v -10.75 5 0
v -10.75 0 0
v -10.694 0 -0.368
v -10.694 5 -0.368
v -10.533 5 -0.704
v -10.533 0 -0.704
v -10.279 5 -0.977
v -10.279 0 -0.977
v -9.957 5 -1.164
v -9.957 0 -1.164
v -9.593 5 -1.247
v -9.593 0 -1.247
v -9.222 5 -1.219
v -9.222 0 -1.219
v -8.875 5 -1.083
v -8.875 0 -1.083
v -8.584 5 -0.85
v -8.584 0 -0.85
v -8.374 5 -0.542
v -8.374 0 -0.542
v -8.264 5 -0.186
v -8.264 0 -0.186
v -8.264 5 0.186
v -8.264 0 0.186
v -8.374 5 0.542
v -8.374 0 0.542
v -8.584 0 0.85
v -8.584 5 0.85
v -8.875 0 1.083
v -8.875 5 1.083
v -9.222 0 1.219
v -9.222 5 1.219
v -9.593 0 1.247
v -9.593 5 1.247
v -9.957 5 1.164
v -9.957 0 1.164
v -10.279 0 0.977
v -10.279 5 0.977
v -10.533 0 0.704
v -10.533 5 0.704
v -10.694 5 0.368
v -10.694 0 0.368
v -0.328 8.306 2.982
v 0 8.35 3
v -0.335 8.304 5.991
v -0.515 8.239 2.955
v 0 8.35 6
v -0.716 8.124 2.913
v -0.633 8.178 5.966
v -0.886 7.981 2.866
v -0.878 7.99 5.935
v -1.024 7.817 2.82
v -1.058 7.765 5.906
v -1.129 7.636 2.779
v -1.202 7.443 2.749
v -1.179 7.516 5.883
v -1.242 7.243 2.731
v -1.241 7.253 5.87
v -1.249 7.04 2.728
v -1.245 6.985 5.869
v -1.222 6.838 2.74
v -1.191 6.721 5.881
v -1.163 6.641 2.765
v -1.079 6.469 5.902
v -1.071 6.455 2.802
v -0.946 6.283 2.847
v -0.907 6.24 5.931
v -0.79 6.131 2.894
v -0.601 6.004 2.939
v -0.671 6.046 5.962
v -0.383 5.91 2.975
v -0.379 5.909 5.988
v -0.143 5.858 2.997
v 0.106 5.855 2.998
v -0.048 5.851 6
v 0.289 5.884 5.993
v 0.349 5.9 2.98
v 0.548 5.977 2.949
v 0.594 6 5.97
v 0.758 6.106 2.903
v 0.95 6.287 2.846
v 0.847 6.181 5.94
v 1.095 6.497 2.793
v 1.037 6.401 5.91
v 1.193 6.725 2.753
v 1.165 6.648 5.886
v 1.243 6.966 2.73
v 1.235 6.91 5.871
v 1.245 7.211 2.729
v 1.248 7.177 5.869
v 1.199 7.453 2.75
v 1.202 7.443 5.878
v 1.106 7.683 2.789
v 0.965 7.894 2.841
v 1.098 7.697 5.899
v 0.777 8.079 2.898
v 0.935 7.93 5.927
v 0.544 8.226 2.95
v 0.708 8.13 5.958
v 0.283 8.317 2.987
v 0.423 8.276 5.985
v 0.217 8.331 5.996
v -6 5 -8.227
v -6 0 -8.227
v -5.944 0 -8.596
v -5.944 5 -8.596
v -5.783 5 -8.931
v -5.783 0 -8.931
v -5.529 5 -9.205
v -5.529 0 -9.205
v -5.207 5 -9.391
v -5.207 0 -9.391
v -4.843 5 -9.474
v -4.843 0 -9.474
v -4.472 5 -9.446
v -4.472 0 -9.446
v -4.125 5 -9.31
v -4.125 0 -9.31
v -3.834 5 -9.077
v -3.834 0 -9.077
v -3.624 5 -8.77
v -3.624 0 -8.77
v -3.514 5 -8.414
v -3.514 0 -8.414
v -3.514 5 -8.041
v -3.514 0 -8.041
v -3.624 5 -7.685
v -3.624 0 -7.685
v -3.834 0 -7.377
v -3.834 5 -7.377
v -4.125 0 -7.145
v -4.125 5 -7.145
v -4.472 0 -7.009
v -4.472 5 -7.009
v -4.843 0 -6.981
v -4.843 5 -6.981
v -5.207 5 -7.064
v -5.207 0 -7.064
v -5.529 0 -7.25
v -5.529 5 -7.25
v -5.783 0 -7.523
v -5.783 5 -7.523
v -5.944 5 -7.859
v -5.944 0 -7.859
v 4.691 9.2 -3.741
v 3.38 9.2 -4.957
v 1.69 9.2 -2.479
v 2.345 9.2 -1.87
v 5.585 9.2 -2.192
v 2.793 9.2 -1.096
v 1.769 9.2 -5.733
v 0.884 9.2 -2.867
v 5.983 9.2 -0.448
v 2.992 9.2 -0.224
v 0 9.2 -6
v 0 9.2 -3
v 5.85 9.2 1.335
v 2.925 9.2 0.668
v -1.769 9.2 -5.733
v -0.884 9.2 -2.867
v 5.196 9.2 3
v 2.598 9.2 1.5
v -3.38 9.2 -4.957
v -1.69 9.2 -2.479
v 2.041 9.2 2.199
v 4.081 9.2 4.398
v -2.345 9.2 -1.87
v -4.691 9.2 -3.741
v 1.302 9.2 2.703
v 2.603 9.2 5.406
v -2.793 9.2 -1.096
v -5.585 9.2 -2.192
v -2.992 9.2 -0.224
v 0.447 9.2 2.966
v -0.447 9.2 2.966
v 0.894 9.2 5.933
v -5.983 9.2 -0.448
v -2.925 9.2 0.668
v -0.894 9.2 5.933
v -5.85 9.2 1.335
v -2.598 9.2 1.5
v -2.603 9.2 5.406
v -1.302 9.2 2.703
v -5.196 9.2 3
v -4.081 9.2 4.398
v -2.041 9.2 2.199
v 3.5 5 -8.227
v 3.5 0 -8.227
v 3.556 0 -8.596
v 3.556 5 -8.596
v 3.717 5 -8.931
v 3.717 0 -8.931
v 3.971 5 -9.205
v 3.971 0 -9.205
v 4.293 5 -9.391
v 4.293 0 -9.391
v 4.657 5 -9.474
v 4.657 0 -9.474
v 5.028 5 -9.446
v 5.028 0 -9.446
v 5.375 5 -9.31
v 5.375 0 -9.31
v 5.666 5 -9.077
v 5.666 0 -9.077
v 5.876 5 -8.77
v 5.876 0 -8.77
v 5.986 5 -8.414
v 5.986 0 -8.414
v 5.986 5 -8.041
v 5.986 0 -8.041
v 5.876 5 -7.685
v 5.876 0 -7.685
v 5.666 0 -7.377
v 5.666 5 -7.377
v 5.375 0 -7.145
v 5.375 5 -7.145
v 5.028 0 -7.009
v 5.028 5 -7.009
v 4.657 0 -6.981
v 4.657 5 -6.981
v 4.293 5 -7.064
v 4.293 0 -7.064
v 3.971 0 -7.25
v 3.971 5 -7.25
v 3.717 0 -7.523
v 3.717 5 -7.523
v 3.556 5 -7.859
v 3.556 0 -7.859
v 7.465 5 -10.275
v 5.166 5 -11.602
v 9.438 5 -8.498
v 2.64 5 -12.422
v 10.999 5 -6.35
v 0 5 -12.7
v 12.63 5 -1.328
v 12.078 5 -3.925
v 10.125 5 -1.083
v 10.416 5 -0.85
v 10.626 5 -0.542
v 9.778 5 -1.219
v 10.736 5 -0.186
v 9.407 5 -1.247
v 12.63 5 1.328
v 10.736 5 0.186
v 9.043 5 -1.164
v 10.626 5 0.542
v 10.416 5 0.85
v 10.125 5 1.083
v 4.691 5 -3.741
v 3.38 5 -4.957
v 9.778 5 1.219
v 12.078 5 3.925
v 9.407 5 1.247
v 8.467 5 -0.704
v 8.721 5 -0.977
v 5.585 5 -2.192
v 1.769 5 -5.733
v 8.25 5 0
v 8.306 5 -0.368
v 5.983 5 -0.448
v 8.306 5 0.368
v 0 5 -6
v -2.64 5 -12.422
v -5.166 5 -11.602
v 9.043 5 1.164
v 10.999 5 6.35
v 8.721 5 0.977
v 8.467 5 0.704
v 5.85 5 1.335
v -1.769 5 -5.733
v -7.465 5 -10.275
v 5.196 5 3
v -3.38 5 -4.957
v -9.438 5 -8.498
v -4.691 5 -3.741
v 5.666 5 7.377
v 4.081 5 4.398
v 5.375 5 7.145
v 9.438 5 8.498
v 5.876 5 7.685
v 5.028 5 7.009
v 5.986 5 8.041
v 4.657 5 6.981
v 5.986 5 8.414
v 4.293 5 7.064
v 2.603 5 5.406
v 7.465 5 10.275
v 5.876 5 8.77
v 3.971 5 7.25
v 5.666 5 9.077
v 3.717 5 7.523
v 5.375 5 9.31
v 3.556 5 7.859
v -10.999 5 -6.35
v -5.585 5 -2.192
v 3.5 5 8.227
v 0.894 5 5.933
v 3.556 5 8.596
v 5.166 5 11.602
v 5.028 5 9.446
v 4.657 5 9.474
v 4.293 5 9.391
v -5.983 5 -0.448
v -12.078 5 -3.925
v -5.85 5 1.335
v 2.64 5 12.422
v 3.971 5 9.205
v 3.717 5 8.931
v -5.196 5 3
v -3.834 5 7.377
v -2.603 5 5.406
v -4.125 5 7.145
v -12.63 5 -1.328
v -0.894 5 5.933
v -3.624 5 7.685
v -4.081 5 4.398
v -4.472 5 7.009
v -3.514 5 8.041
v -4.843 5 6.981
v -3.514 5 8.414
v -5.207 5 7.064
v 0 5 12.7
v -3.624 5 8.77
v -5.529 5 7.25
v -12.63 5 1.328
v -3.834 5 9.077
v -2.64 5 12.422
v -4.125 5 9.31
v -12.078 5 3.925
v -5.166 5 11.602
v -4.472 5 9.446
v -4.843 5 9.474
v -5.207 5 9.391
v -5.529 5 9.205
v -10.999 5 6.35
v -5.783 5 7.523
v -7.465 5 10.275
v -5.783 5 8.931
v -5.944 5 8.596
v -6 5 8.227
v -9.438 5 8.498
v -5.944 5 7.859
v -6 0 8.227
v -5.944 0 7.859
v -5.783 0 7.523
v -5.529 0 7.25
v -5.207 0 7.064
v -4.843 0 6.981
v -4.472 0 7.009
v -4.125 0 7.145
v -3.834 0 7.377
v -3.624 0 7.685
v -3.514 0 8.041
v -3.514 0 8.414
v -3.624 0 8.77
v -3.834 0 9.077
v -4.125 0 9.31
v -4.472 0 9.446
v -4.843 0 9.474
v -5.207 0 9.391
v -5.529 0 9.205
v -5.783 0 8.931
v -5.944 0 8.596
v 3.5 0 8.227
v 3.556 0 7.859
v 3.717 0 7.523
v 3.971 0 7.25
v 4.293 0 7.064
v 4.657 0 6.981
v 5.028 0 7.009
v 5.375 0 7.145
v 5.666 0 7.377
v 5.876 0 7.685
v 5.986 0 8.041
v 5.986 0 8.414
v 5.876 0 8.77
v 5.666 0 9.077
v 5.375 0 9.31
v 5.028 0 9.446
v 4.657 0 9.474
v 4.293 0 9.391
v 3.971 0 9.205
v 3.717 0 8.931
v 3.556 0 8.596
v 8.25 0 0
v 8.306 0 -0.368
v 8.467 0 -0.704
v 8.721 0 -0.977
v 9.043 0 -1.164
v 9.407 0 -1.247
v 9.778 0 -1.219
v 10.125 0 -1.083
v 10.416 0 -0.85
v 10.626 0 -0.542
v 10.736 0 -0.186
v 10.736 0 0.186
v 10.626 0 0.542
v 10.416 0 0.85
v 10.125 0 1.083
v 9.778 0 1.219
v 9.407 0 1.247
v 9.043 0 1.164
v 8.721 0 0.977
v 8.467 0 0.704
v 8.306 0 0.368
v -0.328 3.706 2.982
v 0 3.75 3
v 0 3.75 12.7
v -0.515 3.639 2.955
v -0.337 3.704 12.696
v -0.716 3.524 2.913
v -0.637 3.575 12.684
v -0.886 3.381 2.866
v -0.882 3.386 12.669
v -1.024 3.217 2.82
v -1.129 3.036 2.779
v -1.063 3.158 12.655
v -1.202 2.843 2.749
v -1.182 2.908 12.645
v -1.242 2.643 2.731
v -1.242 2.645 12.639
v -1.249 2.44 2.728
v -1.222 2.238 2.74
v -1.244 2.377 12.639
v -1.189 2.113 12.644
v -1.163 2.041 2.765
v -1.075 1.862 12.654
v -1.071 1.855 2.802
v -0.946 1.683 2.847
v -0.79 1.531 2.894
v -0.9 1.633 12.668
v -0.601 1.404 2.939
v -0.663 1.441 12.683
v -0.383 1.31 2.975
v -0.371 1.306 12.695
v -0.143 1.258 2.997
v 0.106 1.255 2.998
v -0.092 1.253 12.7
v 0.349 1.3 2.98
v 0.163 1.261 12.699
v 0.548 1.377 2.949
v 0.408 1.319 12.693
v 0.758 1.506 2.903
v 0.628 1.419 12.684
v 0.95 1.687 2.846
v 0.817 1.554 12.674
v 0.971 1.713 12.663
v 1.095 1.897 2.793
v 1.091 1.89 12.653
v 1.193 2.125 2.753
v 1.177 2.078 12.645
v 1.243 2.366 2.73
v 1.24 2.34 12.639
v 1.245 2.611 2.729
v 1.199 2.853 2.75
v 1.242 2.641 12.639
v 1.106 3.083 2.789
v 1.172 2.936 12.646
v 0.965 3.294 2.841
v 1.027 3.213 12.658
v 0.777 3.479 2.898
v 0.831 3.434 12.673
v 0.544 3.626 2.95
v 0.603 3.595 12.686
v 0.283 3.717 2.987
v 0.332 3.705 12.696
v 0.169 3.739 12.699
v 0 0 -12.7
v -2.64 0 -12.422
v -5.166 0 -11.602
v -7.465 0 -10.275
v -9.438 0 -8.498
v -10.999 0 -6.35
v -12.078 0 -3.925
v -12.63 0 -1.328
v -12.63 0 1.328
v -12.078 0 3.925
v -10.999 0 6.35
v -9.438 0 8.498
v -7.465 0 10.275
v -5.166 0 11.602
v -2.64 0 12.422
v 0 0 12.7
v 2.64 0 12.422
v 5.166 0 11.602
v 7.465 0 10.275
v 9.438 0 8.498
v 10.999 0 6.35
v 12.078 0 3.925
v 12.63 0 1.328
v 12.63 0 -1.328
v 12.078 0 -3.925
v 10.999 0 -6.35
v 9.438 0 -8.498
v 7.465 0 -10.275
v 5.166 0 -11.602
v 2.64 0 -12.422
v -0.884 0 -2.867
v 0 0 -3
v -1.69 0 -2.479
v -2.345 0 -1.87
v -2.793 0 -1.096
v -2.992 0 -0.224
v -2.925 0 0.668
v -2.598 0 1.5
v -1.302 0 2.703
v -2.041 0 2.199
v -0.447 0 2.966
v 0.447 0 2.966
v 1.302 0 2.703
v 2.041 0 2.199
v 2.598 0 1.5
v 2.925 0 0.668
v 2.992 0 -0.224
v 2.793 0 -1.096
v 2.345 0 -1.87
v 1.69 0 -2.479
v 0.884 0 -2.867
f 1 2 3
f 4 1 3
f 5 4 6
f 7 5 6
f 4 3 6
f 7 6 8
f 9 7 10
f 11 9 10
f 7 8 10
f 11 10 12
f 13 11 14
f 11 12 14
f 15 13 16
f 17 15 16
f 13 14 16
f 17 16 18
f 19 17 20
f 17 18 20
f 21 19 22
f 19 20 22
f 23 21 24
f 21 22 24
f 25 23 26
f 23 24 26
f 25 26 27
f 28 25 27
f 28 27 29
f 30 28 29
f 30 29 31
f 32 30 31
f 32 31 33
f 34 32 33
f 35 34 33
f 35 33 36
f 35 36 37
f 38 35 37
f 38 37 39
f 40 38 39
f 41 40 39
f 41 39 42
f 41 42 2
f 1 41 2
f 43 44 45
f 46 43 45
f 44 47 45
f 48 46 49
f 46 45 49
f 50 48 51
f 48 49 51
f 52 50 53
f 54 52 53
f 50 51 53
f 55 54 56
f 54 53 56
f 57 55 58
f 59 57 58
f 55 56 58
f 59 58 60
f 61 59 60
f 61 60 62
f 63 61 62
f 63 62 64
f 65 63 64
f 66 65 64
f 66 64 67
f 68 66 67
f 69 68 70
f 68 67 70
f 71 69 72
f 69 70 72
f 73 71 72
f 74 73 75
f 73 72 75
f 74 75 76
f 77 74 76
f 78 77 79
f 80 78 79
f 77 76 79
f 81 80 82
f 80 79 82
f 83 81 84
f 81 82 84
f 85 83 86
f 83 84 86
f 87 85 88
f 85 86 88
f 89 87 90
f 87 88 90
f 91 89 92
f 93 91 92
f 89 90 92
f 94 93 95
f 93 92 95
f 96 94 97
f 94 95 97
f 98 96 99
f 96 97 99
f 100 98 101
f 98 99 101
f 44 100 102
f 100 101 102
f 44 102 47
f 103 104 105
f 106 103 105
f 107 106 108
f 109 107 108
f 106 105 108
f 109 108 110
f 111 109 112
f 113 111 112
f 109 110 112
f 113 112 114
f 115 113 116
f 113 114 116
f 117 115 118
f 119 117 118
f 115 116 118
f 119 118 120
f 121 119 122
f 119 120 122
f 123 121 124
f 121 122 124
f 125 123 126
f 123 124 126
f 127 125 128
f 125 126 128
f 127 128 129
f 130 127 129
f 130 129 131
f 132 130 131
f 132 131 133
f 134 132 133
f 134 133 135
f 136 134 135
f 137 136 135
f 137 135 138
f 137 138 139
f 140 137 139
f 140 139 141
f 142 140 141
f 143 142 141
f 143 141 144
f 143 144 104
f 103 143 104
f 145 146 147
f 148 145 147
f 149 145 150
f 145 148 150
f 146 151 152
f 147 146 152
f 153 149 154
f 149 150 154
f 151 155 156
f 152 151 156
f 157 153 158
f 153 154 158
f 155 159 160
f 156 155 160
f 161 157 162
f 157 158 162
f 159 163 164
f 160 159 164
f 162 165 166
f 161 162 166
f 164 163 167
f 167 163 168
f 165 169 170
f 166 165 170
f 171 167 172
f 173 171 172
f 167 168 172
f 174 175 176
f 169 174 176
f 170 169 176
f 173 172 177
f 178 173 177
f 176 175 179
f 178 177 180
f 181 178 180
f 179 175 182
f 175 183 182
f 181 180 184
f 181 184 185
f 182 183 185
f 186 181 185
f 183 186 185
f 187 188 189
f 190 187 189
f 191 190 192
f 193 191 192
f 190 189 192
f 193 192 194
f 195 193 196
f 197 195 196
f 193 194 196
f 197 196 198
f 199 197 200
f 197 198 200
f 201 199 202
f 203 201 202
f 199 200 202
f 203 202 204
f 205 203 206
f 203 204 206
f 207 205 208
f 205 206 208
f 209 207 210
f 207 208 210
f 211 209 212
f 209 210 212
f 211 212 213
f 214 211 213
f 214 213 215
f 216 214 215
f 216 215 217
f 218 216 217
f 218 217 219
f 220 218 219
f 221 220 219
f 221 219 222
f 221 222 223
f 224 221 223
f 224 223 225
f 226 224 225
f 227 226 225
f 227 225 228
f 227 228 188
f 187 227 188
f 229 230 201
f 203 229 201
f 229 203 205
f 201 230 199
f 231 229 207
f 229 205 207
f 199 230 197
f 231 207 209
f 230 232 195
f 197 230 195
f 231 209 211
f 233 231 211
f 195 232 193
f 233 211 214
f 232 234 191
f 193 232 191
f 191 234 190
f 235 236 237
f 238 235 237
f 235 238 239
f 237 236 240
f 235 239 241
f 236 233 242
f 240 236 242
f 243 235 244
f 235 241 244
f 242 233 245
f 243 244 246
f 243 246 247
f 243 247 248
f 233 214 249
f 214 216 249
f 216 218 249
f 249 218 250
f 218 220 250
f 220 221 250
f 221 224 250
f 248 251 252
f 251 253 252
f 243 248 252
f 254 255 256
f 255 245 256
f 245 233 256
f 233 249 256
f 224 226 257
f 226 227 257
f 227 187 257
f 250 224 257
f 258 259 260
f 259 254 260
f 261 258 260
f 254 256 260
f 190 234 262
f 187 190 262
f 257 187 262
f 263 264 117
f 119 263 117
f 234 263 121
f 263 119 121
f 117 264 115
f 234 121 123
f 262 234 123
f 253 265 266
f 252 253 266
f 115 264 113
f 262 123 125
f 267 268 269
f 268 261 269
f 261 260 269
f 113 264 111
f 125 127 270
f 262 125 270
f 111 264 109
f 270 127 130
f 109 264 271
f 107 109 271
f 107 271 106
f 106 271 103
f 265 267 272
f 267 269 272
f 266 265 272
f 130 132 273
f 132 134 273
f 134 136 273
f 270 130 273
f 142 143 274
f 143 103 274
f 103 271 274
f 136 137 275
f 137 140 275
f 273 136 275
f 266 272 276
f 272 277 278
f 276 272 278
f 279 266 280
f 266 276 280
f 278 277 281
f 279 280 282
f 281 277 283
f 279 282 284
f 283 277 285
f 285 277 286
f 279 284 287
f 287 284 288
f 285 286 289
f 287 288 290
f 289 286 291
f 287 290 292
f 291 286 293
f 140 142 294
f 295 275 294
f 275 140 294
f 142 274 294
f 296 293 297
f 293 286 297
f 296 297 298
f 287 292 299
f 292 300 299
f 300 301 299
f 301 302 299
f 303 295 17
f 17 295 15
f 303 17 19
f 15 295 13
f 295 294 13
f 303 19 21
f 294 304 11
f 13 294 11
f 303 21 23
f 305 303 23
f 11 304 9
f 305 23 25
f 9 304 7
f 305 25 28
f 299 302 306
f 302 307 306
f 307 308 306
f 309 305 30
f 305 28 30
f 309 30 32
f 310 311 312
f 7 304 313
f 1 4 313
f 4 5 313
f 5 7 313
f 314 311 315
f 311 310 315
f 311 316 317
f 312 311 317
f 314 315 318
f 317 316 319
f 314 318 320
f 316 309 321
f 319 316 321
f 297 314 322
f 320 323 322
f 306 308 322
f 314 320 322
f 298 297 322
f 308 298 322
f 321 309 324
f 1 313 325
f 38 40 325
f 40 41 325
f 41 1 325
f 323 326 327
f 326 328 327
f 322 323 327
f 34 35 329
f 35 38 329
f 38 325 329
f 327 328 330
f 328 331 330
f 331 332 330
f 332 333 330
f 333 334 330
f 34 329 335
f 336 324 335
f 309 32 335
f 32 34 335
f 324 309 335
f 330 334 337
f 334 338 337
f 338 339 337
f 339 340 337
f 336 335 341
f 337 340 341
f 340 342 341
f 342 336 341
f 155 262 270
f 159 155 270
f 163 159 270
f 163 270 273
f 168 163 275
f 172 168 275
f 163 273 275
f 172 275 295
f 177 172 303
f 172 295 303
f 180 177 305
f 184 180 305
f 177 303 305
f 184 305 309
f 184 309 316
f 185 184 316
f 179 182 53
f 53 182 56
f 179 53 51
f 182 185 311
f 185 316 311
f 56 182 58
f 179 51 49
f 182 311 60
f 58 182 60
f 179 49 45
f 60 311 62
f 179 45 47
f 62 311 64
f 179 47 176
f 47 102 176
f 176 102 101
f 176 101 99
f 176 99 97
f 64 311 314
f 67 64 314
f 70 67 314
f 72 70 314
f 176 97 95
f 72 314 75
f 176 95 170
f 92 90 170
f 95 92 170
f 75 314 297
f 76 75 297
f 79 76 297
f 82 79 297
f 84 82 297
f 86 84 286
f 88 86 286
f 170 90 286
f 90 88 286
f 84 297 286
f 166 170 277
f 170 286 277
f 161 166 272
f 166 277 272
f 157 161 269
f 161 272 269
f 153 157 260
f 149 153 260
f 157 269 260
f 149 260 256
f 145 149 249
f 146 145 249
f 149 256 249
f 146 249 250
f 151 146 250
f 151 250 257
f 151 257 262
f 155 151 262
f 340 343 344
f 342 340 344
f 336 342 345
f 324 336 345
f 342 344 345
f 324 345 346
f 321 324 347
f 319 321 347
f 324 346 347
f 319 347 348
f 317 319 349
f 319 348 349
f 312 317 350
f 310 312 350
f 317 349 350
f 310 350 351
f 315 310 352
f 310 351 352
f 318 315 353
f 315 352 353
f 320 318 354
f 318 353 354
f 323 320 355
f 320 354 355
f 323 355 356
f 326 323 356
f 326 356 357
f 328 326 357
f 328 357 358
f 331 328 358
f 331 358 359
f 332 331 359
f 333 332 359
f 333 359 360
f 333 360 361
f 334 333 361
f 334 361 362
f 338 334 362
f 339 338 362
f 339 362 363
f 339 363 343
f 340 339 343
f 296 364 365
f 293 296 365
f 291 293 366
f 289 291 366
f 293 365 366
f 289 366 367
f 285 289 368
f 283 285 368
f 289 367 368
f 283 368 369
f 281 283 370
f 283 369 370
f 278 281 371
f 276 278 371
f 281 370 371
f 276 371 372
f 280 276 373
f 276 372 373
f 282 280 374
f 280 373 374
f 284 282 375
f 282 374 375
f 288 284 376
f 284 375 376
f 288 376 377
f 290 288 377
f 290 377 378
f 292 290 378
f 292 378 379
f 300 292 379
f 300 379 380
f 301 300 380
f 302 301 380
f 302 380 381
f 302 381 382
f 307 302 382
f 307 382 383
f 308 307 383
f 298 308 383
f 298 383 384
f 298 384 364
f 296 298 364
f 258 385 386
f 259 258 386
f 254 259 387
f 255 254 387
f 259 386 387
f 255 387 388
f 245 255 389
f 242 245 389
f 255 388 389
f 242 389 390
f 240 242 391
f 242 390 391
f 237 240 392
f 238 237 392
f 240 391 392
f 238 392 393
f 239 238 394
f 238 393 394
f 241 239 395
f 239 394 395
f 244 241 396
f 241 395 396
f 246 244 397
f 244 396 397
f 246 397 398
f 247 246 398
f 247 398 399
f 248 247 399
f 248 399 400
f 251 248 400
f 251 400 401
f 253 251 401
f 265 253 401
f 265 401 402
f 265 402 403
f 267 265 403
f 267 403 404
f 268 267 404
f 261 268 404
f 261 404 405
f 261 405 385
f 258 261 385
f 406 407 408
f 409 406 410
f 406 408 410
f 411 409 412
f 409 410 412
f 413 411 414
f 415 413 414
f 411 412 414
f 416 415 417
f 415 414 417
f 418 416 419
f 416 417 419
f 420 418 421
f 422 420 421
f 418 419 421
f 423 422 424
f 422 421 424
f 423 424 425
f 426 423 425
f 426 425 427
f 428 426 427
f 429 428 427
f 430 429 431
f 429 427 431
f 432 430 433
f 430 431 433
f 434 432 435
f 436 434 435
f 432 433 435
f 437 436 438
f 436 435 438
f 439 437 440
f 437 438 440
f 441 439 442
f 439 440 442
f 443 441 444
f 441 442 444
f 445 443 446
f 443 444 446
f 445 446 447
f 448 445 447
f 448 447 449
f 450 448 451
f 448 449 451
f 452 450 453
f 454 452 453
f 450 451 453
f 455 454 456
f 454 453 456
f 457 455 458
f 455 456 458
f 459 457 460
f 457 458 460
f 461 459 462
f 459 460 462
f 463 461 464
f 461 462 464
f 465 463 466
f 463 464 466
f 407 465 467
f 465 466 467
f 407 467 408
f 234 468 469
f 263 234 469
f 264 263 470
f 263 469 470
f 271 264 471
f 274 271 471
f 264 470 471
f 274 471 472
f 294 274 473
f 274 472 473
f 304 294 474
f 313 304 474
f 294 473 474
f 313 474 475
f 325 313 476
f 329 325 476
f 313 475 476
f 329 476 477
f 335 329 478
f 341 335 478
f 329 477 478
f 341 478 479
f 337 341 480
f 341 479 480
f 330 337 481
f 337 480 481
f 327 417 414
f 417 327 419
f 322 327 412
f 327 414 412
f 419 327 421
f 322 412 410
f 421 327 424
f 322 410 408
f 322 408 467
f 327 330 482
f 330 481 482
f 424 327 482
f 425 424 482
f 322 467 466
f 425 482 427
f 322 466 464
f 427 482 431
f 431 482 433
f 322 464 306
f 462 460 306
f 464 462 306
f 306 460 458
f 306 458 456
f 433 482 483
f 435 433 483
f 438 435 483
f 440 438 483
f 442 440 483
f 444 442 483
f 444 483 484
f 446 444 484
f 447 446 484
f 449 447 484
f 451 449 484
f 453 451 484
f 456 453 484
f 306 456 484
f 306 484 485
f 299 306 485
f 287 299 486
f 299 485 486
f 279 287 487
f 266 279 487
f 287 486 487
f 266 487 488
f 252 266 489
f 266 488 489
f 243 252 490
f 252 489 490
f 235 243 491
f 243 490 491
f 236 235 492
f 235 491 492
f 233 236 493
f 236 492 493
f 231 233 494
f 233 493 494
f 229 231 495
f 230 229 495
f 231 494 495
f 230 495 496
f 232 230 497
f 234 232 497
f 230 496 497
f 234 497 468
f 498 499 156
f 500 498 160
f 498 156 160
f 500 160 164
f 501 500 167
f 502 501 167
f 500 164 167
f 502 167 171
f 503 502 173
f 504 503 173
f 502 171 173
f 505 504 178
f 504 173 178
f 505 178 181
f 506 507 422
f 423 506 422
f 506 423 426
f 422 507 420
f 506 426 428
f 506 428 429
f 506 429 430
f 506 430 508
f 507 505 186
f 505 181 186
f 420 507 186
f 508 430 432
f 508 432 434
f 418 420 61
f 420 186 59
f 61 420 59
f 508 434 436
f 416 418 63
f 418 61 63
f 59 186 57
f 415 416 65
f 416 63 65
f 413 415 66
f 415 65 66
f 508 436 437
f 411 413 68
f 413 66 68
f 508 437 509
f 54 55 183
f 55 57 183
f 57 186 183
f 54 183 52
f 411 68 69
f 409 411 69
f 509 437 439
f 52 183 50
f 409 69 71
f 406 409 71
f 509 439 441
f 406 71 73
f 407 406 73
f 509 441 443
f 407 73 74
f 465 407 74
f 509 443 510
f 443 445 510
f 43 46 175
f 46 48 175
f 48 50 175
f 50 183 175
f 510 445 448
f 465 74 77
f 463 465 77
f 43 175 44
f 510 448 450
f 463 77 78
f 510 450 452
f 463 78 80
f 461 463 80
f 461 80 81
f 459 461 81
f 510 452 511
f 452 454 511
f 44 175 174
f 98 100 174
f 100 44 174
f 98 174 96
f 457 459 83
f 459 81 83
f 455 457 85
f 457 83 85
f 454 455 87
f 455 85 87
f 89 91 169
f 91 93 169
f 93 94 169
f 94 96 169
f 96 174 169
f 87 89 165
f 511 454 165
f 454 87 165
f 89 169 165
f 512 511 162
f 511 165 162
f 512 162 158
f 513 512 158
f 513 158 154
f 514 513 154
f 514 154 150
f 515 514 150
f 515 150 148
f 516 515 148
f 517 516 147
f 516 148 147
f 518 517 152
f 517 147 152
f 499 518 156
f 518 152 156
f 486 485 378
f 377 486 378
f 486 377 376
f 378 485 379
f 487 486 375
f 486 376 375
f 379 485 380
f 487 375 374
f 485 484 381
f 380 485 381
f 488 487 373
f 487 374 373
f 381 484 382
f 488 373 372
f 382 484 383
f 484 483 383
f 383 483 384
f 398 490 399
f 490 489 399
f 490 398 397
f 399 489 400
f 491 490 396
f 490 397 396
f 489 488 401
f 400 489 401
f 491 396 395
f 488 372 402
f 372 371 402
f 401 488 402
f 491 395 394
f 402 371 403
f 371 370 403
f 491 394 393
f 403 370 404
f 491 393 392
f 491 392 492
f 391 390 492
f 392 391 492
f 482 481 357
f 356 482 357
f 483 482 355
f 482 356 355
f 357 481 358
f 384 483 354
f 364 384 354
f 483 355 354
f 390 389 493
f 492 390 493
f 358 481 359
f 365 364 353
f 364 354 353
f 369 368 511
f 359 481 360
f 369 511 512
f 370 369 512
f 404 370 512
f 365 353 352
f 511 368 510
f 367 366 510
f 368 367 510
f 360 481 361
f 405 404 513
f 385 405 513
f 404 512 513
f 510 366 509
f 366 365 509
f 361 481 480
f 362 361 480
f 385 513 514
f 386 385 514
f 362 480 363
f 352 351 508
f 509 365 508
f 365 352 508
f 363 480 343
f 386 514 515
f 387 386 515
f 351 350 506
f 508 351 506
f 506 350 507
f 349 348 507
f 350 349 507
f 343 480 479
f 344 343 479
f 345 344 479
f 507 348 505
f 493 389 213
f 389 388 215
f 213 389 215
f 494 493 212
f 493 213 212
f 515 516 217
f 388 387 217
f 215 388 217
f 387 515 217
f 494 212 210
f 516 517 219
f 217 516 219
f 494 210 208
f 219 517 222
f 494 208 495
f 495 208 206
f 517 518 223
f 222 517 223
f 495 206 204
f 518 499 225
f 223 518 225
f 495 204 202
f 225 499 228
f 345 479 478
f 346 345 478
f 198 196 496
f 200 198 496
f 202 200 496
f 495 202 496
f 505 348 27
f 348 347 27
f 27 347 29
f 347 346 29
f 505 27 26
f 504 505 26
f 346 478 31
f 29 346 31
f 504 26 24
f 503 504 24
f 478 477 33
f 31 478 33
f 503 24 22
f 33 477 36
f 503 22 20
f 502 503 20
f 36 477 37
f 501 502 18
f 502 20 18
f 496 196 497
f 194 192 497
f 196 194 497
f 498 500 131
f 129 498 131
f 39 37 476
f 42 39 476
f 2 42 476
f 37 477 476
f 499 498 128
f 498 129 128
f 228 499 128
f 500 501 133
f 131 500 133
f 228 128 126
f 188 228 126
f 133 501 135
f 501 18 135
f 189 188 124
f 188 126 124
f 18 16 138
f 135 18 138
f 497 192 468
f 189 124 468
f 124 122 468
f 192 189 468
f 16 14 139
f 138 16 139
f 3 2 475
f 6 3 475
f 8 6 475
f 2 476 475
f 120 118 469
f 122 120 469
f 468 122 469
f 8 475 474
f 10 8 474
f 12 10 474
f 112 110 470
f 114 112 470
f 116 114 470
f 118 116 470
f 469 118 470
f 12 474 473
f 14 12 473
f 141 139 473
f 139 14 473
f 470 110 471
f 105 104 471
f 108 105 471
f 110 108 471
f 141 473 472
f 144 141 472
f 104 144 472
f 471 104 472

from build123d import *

# Parameters (mm, degrees)
TAP_DRILL_FOR_M3_TAP1_D          = 2.5
SKETCH6_W                        = 1.25
SKETCH6_H                        = 12.7
TAP_DRILL_FOR_M3_TAP2_AT_2_COUNT = 2
TAP_DRILL_FOR_M3_TAP2_AT_2_PITCH = 4.6


with BuildPart() as part:
    # Sketch1 → Revolve1 (revolve)
    with BuildSketch(Plane.XY, mode=Mode.PRIVATE) as revolve1_sk:
        Polygon((3, 0), (3, 9.2), (6, 9.2), (6, 5), (12.7, 5), (12.7, 0), align=None)
    revolve(revolve1_sk.sketch.rotate(Axis((0, 0, 0), (0, 1, 0)), 90), axis=Axis((0, 0, 0), (0, 1, 0)))

    # Tap Drill for M3 Tap1 (through all)
    with Locations(Plane(origin=(0, 5, 0), x_dir=(1, 0, 0), z_dir=(0, 1, 0))):
        with Locations((-9.5, 0), (-4.75, 8.227241336), (4.75, 8.227241336), (9.5, 0), (4.75, -8.227241336), (-4.75, -8.227241336)):
            Hole(TAP_DRILL_FOR_M3_TAP1_D / 2)

    # Sketch6 → Tap Drill for M3 Tap2 (revolve, cut)
    with BuildSketch(Plane(origin=(0, 2.5, 0), x_dir=(0, 1, 0), z_dir=(1, 0, 0))):
        with Locations((0.625, 6.35)):
            Rectangle(SKETCH6_W, SKETCH6_H)
    tap_drill_for_m3_tap2 = revolve(axis=Axis((0, 2.5, -6.35), (0, 0, 1)), mode=Mode.SUBTRACT)

    # Tap Drill for M3 Tap2 at 2: Tap Drill for M3 Tap2 ×2
    with Locations(*[(0, i * TAP_DRILL_FOR_M3_TAP2_AT_2_PITCH, 0) for i in range(1, TAP_DRILL_FOR_M3_TAP2_AT_2_COUNT)]):
        add(tap_drill_for_m3_tap2, mode=Mode.SUBTRACT)


solid = part.part
